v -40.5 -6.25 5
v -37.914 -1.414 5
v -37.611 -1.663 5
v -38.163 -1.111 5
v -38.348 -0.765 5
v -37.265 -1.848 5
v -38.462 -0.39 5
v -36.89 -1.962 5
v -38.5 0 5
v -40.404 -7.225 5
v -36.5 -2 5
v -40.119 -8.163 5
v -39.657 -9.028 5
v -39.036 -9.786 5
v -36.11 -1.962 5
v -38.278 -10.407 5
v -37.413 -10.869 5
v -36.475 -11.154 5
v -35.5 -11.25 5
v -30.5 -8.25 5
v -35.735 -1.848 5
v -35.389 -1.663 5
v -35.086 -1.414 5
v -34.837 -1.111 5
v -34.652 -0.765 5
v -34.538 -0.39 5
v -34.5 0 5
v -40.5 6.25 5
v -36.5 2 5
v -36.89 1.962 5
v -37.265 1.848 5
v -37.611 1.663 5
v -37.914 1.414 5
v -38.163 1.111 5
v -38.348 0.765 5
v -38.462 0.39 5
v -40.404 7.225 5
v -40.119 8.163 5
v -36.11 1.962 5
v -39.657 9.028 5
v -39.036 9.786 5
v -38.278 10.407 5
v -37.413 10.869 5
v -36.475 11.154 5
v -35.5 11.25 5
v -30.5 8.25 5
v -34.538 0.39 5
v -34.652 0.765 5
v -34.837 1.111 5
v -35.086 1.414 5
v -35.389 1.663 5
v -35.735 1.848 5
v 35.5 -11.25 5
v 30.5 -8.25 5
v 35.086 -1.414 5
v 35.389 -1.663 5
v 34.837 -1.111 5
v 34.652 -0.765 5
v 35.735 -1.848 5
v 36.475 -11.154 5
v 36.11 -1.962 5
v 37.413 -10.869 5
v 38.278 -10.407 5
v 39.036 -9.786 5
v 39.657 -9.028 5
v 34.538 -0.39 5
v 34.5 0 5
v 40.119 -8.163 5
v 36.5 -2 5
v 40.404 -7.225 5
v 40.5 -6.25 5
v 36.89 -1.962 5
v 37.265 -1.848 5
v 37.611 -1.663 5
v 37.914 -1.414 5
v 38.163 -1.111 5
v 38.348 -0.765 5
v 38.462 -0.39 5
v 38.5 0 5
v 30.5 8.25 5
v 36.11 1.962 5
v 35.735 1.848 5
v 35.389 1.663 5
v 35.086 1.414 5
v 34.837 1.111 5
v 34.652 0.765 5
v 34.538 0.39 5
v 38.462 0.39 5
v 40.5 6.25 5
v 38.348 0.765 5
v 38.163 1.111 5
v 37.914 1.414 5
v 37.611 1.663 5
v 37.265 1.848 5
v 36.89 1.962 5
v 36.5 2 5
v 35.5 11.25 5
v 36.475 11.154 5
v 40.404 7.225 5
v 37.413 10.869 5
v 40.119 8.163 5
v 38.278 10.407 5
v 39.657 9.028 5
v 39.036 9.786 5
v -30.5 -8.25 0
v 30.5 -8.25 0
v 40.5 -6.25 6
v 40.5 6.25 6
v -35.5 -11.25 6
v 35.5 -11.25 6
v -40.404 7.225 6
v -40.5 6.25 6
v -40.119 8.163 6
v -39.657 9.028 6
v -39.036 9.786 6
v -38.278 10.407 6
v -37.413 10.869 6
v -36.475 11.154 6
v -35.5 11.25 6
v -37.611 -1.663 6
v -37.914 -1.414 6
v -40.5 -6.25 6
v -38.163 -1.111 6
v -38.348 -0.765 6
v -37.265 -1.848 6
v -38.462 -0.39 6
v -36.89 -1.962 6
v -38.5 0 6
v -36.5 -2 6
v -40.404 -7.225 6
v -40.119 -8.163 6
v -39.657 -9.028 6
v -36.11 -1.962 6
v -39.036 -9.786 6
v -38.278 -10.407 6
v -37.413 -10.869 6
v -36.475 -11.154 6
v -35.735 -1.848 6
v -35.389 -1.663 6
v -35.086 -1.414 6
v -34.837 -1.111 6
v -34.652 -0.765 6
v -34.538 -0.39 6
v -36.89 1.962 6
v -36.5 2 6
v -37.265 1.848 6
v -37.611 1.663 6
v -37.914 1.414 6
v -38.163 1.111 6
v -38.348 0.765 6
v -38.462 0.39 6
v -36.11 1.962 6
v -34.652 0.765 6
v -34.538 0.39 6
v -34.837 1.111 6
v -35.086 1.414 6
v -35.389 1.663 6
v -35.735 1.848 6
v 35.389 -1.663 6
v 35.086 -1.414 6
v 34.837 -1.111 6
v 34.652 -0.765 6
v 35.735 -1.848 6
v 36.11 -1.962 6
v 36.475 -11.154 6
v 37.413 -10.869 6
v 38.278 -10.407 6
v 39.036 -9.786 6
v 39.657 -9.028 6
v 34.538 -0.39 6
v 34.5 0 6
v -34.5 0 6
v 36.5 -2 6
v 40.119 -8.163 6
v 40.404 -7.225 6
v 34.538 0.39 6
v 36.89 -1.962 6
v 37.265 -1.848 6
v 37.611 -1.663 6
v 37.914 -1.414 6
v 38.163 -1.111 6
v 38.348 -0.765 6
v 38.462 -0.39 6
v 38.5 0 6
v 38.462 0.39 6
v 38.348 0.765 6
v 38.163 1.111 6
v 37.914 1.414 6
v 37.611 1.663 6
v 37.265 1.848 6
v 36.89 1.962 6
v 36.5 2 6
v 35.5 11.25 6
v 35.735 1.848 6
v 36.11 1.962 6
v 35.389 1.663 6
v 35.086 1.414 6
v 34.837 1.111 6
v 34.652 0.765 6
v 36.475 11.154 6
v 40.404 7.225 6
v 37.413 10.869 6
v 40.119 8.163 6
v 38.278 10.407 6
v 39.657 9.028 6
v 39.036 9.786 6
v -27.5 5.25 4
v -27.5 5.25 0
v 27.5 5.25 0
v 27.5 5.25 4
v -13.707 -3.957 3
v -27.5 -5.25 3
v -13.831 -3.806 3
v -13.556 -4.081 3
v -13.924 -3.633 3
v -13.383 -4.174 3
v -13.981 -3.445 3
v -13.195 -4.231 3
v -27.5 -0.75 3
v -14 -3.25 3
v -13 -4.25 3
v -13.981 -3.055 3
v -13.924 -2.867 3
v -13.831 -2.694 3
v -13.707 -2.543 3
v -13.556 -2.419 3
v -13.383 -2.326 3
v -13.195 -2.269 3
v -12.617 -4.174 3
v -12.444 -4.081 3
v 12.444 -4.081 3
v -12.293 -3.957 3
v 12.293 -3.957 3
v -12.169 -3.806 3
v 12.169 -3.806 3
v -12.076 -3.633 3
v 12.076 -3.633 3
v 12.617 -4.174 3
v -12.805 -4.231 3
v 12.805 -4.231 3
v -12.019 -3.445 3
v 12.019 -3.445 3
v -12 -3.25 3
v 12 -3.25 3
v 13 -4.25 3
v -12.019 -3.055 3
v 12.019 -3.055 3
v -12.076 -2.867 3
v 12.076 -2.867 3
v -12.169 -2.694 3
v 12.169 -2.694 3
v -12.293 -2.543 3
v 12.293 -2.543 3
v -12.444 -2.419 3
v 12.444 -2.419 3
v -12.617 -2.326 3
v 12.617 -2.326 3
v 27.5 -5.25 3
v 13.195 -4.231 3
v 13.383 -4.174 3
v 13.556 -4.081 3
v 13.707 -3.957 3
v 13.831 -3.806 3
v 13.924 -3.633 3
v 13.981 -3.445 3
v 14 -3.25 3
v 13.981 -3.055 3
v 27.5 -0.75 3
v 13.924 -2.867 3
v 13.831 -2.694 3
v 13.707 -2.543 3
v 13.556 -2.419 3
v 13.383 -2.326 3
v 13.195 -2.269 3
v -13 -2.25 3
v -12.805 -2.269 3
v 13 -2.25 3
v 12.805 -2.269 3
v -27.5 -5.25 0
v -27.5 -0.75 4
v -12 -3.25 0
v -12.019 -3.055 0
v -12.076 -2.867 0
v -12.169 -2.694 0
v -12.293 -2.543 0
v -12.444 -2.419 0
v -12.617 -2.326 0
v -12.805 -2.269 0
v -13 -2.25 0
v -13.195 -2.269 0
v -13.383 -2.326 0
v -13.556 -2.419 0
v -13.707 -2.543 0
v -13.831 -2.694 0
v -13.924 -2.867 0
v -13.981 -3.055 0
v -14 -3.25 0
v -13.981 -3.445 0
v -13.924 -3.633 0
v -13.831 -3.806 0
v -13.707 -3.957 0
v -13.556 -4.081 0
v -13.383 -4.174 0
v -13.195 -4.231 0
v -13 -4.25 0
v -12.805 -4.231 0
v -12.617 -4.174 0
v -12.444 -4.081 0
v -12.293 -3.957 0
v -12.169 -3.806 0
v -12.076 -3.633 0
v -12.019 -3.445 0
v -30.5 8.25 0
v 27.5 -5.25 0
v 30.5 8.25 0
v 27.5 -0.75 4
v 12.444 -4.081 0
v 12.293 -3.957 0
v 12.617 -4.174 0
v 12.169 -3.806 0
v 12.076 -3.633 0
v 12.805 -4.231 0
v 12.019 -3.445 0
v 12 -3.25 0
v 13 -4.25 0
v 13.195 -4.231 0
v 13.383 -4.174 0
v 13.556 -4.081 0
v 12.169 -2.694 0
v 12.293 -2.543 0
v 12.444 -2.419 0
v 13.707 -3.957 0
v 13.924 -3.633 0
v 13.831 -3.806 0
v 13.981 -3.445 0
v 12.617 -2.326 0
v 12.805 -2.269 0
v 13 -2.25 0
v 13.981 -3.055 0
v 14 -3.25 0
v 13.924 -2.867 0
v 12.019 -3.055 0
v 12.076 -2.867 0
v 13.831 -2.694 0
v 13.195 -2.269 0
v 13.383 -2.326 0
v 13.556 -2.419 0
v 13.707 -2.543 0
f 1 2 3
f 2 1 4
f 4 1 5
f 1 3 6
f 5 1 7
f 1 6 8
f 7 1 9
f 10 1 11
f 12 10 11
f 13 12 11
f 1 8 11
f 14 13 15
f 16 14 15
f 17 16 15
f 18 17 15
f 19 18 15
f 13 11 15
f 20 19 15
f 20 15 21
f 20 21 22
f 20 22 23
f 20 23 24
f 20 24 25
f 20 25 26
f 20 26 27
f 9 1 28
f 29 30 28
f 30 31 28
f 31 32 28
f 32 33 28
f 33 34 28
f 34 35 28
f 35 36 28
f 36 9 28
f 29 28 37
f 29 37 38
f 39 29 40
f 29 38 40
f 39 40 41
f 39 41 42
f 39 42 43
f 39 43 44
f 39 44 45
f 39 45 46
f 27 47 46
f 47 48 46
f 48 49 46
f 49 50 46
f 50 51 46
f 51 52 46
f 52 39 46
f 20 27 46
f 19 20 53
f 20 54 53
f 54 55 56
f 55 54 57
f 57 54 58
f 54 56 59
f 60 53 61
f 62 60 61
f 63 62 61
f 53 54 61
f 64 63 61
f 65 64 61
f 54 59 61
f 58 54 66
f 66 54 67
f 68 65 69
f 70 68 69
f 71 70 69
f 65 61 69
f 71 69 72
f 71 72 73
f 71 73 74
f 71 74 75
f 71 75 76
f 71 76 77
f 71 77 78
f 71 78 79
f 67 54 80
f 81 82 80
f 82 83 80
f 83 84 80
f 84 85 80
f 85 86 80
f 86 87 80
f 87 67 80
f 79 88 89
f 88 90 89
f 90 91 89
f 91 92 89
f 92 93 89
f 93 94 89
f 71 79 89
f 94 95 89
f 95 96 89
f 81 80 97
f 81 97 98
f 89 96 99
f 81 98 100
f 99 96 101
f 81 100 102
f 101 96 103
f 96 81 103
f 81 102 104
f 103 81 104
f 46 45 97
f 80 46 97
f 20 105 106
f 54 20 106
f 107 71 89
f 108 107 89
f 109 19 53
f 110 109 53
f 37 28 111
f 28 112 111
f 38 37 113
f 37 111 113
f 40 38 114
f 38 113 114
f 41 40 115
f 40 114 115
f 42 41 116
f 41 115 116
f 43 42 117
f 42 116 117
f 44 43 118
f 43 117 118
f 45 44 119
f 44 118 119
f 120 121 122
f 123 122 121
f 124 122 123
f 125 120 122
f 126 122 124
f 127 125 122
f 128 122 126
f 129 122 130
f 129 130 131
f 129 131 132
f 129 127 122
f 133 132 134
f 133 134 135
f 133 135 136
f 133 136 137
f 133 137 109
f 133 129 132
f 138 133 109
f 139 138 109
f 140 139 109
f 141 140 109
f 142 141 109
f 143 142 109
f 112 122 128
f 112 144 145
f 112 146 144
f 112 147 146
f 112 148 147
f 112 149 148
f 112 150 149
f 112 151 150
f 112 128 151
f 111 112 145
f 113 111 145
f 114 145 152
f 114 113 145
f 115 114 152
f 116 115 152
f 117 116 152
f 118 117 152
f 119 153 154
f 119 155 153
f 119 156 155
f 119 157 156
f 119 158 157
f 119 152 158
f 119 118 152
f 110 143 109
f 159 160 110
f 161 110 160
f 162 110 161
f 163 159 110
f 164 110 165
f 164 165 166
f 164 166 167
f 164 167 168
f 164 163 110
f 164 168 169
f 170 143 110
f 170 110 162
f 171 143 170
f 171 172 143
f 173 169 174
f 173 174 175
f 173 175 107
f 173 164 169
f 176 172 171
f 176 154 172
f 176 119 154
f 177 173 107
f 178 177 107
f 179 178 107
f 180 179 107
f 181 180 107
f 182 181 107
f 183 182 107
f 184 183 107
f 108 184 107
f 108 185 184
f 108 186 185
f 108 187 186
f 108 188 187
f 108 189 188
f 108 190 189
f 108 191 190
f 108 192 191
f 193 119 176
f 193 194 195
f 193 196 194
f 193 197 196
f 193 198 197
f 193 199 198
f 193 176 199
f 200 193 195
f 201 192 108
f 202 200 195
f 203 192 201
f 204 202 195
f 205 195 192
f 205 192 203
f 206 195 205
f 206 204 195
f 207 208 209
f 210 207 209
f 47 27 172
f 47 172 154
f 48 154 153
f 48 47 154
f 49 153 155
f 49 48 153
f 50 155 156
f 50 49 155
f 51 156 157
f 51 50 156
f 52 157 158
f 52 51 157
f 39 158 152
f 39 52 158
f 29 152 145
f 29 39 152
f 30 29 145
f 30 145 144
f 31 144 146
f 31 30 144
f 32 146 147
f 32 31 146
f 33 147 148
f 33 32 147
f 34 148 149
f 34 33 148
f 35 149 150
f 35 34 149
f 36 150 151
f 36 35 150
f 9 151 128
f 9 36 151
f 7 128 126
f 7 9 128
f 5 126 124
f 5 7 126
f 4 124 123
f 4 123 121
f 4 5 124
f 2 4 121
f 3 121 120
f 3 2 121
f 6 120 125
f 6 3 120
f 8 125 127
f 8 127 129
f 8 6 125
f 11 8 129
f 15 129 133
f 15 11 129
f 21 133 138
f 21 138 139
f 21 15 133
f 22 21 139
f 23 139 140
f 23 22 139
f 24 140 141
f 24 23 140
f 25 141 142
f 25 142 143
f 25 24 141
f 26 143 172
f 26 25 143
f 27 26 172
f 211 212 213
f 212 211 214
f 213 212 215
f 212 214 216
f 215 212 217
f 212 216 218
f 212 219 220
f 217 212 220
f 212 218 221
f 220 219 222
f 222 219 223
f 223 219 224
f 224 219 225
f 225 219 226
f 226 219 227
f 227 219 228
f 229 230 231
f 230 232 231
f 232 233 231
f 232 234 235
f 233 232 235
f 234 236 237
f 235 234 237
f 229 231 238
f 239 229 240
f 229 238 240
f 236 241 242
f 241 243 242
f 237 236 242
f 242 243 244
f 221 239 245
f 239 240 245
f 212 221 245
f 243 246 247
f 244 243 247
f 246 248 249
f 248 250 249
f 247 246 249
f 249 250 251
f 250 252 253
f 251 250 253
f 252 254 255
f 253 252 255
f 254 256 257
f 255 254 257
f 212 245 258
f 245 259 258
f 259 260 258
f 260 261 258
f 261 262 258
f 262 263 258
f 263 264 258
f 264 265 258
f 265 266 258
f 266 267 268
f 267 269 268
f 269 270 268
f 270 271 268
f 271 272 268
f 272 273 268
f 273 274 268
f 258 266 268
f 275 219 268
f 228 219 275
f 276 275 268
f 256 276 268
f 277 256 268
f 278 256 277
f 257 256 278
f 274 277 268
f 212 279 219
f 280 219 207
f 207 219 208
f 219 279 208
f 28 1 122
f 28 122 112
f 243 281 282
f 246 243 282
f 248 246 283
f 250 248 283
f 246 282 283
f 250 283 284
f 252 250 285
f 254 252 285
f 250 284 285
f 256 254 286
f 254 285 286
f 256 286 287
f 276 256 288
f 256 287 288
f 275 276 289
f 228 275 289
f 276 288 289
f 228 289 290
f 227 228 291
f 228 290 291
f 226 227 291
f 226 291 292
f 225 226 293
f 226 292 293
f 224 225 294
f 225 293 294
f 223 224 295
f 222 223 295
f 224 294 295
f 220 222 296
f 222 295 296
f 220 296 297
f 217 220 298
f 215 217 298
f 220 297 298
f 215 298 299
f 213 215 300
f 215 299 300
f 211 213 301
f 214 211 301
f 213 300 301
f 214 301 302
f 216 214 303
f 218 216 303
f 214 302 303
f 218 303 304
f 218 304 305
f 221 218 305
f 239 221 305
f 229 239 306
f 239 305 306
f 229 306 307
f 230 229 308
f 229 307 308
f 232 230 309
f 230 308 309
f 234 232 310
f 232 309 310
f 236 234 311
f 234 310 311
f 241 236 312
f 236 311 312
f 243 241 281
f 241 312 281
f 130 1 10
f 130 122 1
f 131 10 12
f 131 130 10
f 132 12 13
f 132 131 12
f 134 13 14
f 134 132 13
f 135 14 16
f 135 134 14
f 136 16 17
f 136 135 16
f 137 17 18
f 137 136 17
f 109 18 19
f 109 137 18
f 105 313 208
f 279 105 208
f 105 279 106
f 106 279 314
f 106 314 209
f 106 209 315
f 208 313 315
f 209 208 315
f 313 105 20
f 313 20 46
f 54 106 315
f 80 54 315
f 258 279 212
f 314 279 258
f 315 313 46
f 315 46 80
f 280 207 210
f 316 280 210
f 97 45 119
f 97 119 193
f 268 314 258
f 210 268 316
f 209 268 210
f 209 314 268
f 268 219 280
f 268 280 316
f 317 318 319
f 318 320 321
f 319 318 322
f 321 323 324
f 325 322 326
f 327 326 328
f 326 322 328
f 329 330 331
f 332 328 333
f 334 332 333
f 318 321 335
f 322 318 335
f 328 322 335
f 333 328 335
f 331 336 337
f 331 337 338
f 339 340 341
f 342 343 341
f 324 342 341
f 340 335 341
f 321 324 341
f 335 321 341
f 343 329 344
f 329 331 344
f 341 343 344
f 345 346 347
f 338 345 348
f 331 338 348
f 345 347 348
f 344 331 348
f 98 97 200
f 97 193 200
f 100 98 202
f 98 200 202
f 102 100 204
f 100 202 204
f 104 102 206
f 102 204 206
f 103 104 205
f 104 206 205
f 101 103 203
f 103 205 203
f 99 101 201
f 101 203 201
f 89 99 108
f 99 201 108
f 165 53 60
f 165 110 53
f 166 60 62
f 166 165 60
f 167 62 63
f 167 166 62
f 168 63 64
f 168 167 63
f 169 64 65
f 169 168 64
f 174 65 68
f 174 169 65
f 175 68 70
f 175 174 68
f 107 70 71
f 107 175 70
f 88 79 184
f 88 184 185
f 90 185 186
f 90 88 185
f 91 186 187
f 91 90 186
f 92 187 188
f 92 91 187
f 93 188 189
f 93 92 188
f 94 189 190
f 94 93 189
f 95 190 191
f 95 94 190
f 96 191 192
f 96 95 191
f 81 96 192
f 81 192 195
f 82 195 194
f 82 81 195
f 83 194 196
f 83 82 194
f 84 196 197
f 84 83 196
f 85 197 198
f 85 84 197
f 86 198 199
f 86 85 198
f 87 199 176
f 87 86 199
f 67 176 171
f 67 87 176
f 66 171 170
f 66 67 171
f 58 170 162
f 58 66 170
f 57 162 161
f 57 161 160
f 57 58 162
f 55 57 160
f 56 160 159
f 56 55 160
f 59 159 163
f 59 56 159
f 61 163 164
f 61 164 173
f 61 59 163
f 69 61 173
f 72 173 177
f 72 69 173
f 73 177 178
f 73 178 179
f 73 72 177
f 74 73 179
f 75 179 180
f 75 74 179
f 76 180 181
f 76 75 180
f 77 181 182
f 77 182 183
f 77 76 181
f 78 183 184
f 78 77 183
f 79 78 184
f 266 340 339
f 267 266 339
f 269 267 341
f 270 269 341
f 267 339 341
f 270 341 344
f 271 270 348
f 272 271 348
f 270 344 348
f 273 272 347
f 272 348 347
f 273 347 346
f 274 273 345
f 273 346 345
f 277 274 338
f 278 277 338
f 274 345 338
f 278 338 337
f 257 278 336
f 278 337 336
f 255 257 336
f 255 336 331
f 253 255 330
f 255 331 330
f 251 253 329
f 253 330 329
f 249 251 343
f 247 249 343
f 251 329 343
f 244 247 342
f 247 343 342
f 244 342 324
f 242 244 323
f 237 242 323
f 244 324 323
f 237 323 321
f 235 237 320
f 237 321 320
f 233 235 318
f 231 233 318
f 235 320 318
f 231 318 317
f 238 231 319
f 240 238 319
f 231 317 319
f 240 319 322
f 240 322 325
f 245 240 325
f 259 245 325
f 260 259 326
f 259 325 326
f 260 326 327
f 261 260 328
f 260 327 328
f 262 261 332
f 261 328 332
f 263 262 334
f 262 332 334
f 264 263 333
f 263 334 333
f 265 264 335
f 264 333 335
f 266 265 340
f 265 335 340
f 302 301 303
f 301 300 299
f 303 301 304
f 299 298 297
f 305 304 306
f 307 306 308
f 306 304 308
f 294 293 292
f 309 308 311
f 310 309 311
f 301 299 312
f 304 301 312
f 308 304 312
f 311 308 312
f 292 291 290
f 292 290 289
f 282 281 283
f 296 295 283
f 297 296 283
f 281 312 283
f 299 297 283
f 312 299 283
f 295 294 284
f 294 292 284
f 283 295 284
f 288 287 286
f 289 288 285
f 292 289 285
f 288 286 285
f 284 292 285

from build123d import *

# Parameters (mm, degrees)
SKETCH_W        = 61
SKETCH_H        = 16.5
PAD_DEPTH       = 6
SKETCH001_W     = 55
SKETCH001_H     = 10.5
SKETCH001_R     = 1
POCKET_DEPTH    = 3
SKETCH002_W     = 55
SKETCH002_H     = 6
POCKET001_DEPTH = 4
PAD001_START    = 5
SKETCH003_W     = 81
SKETCH003_H     = 22.5
SKETCH003_R     = 2
PAD001_DEPTH    = 1
FILLET_R        = 5


with BuildPart() as part:
    # Sketch → Pad (new body)
    with BuildSketch(Plane.XY):
        Rectangle(SKETCH_W, SKETCH_H)
    extrude(amount=PAD_DEPTH)

    # Sketch001 → Pocket (cut)
    with BuildSketch(Plane.XY):
        Rectangle(SKETCH001_W, SKETCH001_H)
        with Locations((-13, -3.25)):
            Circle(SKETCH001_R, mode=Mode.SUBTRACT)
        with Locations((13, -3.25)):
            Circle(SKETCH001_R, mode=Mode.SUBTRACT)
    extrude(amount=POCKET_DEPTH, mode=Mode.SUBTRACT)

    # Sketch002 → Pocket001 (cut)
    with BuildSketch(Plane.XY):
        with Locations((0, 2.25)):
            Rectangle(SKETCH002_W, SKETCH002_H)
    extrude(amount=POCKET001_DEPTH, mode=Mode.SUBTRACT)

    # Sketch003 → Pad001 (join)
    with BuildSketch(Plane.XY.offset(PAD001_START)):
        Rectangle(SKETCH003_W, SKETCH003_H)
        with Locations((36.5, 0)):
            Circle(SKETCH003_R, mode=Mode.SUBTRACT)
        with Locations((-36.5, 0)):
            Circle(SKETCH003_R, mode=Mode.SUBTRACT)
    extrude(amount=PAD001_DEPTH)

    # Fillet
    fillet_edges = [part.edges().sort_by_distance(p)[0] for p in [
        (-40.5, 11.25, 5.5),
        (-40.5, -11.25, 5.5),
        (40.5, -11.25, 5.5),
        (40.5, 11.25, 5.5),
    ]]
    fillet(fillet_edges, radius=FILLET_R)


solid = part.part
